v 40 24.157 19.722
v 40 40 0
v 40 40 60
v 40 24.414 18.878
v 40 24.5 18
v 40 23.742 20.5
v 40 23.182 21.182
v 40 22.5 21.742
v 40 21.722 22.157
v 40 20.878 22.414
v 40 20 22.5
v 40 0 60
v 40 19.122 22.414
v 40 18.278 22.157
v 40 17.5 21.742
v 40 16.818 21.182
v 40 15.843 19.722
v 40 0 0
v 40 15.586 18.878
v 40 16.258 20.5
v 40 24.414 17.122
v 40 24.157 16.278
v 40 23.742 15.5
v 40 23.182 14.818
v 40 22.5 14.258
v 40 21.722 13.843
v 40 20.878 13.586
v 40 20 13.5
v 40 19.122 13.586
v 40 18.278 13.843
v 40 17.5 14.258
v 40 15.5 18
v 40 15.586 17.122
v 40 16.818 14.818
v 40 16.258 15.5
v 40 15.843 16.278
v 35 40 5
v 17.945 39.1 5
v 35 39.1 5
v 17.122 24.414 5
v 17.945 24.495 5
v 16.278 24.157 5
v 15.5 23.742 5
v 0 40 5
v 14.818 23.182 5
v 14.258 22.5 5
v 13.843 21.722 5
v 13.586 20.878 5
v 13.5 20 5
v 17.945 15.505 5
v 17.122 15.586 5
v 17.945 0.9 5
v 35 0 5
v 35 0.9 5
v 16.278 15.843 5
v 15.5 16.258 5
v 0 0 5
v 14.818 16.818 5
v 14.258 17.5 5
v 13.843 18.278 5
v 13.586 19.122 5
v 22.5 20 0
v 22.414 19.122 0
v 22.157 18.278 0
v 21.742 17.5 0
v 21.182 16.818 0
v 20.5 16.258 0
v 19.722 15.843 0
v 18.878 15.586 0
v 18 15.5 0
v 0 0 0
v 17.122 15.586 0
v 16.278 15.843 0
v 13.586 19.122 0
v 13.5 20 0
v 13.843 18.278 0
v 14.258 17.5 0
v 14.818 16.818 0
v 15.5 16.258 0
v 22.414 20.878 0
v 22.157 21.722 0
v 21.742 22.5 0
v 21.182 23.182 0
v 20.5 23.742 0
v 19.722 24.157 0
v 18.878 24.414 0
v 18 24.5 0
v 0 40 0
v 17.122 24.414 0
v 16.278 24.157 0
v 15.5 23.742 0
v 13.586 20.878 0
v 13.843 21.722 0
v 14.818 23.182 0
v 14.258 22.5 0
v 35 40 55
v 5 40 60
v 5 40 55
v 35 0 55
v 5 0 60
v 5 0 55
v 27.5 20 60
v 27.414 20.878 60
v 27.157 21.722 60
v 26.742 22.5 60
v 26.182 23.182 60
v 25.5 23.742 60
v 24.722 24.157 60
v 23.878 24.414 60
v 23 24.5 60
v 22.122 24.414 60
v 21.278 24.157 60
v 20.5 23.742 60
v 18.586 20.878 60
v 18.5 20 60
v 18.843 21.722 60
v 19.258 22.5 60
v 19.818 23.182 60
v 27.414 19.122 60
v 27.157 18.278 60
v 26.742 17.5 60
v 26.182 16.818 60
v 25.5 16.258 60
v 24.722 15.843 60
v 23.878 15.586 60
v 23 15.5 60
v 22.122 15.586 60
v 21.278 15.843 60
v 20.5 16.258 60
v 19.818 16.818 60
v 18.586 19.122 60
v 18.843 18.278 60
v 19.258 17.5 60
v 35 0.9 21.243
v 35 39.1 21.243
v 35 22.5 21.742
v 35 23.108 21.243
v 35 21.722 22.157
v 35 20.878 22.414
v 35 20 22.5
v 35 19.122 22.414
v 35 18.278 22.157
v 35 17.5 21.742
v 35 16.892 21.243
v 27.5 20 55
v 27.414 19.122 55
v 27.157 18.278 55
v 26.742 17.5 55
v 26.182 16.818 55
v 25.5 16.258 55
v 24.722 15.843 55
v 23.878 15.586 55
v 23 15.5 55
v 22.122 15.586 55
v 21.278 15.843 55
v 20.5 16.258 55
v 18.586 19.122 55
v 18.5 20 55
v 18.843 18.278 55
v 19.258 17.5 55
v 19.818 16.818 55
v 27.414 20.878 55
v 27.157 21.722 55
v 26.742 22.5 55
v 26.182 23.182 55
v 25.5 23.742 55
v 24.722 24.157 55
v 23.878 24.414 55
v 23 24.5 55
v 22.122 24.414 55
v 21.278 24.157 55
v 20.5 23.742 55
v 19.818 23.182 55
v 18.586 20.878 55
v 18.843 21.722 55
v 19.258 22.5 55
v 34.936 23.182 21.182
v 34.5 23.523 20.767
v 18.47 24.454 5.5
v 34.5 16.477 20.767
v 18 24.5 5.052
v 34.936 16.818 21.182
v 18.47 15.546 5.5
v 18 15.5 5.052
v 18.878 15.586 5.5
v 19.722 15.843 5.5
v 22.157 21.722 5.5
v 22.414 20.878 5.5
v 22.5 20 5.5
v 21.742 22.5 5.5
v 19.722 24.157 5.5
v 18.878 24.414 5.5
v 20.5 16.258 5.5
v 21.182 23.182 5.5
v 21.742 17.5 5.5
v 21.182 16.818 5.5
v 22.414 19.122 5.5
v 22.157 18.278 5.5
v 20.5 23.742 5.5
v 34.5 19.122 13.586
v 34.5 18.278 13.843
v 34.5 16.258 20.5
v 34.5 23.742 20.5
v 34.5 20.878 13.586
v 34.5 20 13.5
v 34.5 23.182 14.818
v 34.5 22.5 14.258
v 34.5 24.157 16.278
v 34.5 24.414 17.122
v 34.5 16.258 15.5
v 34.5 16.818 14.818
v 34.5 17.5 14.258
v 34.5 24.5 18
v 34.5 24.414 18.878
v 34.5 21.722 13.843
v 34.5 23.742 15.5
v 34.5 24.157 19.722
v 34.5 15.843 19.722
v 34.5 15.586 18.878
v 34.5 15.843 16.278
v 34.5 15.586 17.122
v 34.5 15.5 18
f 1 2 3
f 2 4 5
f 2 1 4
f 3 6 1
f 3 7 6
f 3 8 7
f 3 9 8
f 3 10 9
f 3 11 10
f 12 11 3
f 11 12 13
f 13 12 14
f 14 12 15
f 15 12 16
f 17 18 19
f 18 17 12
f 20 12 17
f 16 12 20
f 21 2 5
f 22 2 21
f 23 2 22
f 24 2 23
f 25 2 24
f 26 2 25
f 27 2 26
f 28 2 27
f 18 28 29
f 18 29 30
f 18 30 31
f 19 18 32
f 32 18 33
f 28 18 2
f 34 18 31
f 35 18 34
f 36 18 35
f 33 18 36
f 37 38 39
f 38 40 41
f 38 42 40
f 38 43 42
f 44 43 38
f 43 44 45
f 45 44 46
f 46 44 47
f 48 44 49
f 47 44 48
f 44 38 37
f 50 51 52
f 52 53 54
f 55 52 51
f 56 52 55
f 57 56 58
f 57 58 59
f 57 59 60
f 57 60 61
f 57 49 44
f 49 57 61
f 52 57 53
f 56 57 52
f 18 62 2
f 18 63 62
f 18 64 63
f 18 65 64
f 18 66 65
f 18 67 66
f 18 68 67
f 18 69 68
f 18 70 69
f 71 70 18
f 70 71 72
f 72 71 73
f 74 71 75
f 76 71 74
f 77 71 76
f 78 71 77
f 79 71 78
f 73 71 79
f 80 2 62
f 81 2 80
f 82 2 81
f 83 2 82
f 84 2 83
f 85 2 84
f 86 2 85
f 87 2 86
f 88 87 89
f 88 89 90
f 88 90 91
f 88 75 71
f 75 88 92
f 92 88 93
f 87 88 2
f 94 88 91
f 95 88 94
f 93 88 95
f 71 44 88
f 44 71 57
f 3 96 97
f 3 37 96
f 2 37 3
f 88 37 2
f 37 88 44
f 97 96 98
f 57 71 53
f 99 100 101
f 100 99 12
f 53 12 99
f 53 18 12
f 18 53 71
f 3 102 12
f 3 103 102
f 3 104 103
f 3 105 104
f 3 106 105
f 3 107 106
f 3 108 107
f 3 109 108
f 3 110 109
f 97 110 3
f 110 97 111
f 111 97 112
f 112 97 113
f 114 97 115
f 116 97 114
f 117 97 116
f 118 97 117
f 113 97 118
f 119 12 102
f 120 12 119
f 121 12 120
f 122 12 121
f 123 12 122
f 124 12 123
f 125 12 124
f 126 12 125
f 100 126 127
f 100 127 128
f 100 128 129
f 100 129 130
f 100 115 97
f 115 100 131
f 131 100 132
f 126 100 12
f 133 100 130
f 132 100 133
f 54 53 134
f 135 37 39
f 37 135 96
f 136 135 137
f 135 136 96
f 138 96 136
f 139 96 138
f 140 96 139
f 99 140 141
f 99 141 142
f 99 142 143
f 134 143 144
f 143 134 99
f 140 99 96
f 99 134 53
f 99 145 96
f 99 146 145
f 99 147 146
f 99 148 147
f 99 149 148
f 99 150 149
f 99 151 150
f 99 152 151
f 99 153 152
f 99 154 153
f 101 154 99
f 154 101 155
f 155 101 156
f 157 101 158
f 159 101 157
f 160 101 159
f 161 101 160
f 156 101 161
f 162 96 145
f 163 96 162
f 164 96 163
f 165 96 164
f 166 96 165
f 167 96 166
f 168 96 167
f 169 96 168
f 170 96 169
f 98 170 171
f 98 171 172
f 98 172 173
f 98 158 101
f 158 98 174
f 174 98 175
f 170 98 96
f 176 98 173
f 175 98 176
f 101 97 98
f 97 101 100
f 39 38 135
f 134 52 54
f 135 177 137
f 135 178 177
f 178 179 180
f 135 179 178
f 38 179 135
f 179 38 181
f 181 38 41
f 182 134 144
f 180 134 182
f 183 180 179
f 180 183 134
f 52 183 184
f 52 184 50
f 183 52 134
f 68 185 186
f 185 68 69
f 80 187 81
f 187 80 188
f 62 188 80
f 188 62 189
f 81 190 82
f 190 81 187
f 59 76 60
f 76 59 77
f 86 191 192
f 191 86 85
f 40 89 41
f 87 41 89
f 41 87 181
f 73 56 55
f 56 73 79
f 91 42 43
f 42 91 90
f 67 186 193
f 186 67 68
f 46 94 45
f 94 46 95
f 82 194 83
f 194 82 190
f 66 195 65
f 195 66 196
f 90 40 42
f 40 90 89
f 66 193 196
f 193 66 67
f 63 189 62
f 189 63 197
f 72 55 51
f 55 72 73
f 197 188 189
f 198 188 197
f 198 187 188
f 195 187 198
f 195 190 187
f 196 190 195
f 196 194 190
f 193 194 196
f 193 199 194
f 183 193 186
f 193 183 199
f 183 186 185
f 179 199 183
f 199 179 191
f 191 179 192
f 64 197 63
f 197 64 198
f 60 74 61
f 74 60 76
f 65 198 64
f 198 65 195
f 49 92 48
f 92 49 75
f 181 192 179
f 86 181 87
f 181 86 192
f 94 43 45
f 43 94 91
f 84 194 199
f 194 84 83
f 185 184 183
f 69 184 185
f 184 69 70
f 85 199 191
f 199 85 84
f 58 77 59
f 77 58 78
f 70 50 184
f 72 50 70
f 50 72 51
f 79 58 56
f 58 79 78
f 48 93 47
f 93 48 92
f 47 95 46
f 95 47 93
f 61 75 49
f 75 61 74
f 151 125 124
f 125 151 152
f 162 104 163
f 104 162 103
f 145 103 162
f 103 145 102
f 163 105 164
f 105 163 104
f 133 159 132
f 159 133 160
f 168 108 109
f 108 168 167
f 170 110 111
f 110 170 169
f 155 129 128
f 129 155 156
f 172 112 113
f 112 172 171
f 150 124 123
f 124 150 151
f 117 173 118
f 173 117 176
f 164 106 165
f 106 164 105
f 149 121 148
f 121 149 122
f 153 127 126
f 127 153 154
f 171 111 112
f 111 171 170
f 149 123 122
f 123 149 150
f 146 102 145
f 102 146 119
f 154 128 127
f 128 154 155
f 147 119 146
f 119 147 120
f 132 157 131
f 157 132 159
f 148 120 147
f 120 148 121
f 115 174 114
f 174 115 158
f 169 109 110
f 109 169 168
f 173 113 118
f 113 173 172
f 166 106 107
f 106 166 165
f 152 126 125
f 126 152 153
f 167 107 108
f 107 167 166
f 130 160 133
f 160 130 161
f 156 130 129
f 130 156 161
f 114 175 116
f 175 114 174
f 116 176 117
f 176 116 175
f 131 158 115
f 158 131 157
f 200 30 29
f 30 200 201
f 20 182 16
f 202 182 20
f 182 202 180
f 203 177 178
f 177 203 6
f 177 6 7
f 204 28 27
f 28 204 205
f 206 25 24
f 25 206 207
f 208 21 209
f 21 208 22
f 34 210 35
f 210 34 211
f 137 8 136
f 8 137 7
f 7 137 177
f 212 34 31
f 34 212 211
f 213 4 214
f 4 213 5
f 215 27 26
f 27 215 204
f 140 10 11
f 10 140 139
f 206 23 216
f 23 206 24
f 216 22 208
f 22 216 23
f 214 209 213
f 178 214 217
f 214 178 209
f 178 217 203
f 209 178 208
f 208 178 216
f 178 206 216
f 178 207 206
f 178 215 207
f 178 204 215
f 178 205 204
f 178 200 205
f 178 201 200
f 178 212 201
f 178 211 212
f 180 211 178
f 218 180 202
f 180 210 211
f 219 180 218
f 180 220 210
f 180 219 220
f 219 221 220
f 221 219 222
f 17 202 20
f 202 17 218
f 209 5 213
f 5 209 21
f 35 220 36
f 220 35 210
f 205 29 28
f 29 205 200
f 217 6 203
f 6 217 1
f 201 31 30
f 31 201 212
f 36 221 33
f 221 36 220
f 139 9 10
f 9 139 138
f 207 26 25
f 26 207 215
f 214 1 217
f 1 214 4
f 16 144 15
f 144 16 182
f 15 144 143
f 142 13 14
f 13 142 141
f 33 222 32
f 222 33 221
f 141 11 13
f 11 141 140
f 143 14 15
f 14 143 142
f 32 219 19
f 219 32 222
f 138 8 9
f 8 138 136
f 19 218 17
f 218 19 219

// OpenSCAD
$fn = 32;

// ----------------------------------------------------------------------
// Z-bracket: 40 x 40 x 60 mm
// ----------------------------------------------------------------------

// --- parameters (mm) ---
foot_len = 40;            // lower foot length, X
top_len = 30;             // upper foot length, X
depth = 40;               // bracket width, Y
step_h = 60;              // overall rise, Z
plate_t = 5;              // plate thickness
hole_d = 9;               // clearance for M8
rib_len = 18;             // gusset leg
rib_sink = 0.9;           // gusset overlap into the plates

module hole_z(px, py, z0) {
  translate([px, py, z0 - 0.5]) cylinder(h = plate_t + 1, d = hole_d);
}
module hole_x(py, pz) {
  translate([-0.5, py, pz]) rotate([0, 90, 0]) cylinder(h = plate_t + 1, d = hole_d);
}
module gusset(x0) {
  translate([x0, depth - rib_sink, 0])
    rotate([90, 0, 0])
      linear_extrude(height = depth - 2 * rib_sink)
        polygon(points = [[rib_sink, plate_t - rib_sink],
                          [rib_sink, plate_t - rib_sink + rib_len],
                          [-rib_len, plate_t - rib_sink]]);
}

difference() {
  union() {
    cube([foot_len, depth, plate_t]);
    /* web, overlapping the lower foot */
    translate([foot_len - plate_t, 0, 0]) cube([plate_t, depth, step_h]);
    /* upper foot, sunk into the web */
    translate([foot_len - plate_t - top_len, 0, step_h - plate_t]) cube([top_len + plate_t, depth, plate_t]);
    gusset(foot_len - plate_t);
  }
  hole_z(18, 20, 0);
  translate([foot_len - plate_t - 12, 0, 0]) hole_z(0, 20, step_h - plate_t);
  translate([foot_len - plate_t, 0, 0]) hole_x(20, 18);
}
